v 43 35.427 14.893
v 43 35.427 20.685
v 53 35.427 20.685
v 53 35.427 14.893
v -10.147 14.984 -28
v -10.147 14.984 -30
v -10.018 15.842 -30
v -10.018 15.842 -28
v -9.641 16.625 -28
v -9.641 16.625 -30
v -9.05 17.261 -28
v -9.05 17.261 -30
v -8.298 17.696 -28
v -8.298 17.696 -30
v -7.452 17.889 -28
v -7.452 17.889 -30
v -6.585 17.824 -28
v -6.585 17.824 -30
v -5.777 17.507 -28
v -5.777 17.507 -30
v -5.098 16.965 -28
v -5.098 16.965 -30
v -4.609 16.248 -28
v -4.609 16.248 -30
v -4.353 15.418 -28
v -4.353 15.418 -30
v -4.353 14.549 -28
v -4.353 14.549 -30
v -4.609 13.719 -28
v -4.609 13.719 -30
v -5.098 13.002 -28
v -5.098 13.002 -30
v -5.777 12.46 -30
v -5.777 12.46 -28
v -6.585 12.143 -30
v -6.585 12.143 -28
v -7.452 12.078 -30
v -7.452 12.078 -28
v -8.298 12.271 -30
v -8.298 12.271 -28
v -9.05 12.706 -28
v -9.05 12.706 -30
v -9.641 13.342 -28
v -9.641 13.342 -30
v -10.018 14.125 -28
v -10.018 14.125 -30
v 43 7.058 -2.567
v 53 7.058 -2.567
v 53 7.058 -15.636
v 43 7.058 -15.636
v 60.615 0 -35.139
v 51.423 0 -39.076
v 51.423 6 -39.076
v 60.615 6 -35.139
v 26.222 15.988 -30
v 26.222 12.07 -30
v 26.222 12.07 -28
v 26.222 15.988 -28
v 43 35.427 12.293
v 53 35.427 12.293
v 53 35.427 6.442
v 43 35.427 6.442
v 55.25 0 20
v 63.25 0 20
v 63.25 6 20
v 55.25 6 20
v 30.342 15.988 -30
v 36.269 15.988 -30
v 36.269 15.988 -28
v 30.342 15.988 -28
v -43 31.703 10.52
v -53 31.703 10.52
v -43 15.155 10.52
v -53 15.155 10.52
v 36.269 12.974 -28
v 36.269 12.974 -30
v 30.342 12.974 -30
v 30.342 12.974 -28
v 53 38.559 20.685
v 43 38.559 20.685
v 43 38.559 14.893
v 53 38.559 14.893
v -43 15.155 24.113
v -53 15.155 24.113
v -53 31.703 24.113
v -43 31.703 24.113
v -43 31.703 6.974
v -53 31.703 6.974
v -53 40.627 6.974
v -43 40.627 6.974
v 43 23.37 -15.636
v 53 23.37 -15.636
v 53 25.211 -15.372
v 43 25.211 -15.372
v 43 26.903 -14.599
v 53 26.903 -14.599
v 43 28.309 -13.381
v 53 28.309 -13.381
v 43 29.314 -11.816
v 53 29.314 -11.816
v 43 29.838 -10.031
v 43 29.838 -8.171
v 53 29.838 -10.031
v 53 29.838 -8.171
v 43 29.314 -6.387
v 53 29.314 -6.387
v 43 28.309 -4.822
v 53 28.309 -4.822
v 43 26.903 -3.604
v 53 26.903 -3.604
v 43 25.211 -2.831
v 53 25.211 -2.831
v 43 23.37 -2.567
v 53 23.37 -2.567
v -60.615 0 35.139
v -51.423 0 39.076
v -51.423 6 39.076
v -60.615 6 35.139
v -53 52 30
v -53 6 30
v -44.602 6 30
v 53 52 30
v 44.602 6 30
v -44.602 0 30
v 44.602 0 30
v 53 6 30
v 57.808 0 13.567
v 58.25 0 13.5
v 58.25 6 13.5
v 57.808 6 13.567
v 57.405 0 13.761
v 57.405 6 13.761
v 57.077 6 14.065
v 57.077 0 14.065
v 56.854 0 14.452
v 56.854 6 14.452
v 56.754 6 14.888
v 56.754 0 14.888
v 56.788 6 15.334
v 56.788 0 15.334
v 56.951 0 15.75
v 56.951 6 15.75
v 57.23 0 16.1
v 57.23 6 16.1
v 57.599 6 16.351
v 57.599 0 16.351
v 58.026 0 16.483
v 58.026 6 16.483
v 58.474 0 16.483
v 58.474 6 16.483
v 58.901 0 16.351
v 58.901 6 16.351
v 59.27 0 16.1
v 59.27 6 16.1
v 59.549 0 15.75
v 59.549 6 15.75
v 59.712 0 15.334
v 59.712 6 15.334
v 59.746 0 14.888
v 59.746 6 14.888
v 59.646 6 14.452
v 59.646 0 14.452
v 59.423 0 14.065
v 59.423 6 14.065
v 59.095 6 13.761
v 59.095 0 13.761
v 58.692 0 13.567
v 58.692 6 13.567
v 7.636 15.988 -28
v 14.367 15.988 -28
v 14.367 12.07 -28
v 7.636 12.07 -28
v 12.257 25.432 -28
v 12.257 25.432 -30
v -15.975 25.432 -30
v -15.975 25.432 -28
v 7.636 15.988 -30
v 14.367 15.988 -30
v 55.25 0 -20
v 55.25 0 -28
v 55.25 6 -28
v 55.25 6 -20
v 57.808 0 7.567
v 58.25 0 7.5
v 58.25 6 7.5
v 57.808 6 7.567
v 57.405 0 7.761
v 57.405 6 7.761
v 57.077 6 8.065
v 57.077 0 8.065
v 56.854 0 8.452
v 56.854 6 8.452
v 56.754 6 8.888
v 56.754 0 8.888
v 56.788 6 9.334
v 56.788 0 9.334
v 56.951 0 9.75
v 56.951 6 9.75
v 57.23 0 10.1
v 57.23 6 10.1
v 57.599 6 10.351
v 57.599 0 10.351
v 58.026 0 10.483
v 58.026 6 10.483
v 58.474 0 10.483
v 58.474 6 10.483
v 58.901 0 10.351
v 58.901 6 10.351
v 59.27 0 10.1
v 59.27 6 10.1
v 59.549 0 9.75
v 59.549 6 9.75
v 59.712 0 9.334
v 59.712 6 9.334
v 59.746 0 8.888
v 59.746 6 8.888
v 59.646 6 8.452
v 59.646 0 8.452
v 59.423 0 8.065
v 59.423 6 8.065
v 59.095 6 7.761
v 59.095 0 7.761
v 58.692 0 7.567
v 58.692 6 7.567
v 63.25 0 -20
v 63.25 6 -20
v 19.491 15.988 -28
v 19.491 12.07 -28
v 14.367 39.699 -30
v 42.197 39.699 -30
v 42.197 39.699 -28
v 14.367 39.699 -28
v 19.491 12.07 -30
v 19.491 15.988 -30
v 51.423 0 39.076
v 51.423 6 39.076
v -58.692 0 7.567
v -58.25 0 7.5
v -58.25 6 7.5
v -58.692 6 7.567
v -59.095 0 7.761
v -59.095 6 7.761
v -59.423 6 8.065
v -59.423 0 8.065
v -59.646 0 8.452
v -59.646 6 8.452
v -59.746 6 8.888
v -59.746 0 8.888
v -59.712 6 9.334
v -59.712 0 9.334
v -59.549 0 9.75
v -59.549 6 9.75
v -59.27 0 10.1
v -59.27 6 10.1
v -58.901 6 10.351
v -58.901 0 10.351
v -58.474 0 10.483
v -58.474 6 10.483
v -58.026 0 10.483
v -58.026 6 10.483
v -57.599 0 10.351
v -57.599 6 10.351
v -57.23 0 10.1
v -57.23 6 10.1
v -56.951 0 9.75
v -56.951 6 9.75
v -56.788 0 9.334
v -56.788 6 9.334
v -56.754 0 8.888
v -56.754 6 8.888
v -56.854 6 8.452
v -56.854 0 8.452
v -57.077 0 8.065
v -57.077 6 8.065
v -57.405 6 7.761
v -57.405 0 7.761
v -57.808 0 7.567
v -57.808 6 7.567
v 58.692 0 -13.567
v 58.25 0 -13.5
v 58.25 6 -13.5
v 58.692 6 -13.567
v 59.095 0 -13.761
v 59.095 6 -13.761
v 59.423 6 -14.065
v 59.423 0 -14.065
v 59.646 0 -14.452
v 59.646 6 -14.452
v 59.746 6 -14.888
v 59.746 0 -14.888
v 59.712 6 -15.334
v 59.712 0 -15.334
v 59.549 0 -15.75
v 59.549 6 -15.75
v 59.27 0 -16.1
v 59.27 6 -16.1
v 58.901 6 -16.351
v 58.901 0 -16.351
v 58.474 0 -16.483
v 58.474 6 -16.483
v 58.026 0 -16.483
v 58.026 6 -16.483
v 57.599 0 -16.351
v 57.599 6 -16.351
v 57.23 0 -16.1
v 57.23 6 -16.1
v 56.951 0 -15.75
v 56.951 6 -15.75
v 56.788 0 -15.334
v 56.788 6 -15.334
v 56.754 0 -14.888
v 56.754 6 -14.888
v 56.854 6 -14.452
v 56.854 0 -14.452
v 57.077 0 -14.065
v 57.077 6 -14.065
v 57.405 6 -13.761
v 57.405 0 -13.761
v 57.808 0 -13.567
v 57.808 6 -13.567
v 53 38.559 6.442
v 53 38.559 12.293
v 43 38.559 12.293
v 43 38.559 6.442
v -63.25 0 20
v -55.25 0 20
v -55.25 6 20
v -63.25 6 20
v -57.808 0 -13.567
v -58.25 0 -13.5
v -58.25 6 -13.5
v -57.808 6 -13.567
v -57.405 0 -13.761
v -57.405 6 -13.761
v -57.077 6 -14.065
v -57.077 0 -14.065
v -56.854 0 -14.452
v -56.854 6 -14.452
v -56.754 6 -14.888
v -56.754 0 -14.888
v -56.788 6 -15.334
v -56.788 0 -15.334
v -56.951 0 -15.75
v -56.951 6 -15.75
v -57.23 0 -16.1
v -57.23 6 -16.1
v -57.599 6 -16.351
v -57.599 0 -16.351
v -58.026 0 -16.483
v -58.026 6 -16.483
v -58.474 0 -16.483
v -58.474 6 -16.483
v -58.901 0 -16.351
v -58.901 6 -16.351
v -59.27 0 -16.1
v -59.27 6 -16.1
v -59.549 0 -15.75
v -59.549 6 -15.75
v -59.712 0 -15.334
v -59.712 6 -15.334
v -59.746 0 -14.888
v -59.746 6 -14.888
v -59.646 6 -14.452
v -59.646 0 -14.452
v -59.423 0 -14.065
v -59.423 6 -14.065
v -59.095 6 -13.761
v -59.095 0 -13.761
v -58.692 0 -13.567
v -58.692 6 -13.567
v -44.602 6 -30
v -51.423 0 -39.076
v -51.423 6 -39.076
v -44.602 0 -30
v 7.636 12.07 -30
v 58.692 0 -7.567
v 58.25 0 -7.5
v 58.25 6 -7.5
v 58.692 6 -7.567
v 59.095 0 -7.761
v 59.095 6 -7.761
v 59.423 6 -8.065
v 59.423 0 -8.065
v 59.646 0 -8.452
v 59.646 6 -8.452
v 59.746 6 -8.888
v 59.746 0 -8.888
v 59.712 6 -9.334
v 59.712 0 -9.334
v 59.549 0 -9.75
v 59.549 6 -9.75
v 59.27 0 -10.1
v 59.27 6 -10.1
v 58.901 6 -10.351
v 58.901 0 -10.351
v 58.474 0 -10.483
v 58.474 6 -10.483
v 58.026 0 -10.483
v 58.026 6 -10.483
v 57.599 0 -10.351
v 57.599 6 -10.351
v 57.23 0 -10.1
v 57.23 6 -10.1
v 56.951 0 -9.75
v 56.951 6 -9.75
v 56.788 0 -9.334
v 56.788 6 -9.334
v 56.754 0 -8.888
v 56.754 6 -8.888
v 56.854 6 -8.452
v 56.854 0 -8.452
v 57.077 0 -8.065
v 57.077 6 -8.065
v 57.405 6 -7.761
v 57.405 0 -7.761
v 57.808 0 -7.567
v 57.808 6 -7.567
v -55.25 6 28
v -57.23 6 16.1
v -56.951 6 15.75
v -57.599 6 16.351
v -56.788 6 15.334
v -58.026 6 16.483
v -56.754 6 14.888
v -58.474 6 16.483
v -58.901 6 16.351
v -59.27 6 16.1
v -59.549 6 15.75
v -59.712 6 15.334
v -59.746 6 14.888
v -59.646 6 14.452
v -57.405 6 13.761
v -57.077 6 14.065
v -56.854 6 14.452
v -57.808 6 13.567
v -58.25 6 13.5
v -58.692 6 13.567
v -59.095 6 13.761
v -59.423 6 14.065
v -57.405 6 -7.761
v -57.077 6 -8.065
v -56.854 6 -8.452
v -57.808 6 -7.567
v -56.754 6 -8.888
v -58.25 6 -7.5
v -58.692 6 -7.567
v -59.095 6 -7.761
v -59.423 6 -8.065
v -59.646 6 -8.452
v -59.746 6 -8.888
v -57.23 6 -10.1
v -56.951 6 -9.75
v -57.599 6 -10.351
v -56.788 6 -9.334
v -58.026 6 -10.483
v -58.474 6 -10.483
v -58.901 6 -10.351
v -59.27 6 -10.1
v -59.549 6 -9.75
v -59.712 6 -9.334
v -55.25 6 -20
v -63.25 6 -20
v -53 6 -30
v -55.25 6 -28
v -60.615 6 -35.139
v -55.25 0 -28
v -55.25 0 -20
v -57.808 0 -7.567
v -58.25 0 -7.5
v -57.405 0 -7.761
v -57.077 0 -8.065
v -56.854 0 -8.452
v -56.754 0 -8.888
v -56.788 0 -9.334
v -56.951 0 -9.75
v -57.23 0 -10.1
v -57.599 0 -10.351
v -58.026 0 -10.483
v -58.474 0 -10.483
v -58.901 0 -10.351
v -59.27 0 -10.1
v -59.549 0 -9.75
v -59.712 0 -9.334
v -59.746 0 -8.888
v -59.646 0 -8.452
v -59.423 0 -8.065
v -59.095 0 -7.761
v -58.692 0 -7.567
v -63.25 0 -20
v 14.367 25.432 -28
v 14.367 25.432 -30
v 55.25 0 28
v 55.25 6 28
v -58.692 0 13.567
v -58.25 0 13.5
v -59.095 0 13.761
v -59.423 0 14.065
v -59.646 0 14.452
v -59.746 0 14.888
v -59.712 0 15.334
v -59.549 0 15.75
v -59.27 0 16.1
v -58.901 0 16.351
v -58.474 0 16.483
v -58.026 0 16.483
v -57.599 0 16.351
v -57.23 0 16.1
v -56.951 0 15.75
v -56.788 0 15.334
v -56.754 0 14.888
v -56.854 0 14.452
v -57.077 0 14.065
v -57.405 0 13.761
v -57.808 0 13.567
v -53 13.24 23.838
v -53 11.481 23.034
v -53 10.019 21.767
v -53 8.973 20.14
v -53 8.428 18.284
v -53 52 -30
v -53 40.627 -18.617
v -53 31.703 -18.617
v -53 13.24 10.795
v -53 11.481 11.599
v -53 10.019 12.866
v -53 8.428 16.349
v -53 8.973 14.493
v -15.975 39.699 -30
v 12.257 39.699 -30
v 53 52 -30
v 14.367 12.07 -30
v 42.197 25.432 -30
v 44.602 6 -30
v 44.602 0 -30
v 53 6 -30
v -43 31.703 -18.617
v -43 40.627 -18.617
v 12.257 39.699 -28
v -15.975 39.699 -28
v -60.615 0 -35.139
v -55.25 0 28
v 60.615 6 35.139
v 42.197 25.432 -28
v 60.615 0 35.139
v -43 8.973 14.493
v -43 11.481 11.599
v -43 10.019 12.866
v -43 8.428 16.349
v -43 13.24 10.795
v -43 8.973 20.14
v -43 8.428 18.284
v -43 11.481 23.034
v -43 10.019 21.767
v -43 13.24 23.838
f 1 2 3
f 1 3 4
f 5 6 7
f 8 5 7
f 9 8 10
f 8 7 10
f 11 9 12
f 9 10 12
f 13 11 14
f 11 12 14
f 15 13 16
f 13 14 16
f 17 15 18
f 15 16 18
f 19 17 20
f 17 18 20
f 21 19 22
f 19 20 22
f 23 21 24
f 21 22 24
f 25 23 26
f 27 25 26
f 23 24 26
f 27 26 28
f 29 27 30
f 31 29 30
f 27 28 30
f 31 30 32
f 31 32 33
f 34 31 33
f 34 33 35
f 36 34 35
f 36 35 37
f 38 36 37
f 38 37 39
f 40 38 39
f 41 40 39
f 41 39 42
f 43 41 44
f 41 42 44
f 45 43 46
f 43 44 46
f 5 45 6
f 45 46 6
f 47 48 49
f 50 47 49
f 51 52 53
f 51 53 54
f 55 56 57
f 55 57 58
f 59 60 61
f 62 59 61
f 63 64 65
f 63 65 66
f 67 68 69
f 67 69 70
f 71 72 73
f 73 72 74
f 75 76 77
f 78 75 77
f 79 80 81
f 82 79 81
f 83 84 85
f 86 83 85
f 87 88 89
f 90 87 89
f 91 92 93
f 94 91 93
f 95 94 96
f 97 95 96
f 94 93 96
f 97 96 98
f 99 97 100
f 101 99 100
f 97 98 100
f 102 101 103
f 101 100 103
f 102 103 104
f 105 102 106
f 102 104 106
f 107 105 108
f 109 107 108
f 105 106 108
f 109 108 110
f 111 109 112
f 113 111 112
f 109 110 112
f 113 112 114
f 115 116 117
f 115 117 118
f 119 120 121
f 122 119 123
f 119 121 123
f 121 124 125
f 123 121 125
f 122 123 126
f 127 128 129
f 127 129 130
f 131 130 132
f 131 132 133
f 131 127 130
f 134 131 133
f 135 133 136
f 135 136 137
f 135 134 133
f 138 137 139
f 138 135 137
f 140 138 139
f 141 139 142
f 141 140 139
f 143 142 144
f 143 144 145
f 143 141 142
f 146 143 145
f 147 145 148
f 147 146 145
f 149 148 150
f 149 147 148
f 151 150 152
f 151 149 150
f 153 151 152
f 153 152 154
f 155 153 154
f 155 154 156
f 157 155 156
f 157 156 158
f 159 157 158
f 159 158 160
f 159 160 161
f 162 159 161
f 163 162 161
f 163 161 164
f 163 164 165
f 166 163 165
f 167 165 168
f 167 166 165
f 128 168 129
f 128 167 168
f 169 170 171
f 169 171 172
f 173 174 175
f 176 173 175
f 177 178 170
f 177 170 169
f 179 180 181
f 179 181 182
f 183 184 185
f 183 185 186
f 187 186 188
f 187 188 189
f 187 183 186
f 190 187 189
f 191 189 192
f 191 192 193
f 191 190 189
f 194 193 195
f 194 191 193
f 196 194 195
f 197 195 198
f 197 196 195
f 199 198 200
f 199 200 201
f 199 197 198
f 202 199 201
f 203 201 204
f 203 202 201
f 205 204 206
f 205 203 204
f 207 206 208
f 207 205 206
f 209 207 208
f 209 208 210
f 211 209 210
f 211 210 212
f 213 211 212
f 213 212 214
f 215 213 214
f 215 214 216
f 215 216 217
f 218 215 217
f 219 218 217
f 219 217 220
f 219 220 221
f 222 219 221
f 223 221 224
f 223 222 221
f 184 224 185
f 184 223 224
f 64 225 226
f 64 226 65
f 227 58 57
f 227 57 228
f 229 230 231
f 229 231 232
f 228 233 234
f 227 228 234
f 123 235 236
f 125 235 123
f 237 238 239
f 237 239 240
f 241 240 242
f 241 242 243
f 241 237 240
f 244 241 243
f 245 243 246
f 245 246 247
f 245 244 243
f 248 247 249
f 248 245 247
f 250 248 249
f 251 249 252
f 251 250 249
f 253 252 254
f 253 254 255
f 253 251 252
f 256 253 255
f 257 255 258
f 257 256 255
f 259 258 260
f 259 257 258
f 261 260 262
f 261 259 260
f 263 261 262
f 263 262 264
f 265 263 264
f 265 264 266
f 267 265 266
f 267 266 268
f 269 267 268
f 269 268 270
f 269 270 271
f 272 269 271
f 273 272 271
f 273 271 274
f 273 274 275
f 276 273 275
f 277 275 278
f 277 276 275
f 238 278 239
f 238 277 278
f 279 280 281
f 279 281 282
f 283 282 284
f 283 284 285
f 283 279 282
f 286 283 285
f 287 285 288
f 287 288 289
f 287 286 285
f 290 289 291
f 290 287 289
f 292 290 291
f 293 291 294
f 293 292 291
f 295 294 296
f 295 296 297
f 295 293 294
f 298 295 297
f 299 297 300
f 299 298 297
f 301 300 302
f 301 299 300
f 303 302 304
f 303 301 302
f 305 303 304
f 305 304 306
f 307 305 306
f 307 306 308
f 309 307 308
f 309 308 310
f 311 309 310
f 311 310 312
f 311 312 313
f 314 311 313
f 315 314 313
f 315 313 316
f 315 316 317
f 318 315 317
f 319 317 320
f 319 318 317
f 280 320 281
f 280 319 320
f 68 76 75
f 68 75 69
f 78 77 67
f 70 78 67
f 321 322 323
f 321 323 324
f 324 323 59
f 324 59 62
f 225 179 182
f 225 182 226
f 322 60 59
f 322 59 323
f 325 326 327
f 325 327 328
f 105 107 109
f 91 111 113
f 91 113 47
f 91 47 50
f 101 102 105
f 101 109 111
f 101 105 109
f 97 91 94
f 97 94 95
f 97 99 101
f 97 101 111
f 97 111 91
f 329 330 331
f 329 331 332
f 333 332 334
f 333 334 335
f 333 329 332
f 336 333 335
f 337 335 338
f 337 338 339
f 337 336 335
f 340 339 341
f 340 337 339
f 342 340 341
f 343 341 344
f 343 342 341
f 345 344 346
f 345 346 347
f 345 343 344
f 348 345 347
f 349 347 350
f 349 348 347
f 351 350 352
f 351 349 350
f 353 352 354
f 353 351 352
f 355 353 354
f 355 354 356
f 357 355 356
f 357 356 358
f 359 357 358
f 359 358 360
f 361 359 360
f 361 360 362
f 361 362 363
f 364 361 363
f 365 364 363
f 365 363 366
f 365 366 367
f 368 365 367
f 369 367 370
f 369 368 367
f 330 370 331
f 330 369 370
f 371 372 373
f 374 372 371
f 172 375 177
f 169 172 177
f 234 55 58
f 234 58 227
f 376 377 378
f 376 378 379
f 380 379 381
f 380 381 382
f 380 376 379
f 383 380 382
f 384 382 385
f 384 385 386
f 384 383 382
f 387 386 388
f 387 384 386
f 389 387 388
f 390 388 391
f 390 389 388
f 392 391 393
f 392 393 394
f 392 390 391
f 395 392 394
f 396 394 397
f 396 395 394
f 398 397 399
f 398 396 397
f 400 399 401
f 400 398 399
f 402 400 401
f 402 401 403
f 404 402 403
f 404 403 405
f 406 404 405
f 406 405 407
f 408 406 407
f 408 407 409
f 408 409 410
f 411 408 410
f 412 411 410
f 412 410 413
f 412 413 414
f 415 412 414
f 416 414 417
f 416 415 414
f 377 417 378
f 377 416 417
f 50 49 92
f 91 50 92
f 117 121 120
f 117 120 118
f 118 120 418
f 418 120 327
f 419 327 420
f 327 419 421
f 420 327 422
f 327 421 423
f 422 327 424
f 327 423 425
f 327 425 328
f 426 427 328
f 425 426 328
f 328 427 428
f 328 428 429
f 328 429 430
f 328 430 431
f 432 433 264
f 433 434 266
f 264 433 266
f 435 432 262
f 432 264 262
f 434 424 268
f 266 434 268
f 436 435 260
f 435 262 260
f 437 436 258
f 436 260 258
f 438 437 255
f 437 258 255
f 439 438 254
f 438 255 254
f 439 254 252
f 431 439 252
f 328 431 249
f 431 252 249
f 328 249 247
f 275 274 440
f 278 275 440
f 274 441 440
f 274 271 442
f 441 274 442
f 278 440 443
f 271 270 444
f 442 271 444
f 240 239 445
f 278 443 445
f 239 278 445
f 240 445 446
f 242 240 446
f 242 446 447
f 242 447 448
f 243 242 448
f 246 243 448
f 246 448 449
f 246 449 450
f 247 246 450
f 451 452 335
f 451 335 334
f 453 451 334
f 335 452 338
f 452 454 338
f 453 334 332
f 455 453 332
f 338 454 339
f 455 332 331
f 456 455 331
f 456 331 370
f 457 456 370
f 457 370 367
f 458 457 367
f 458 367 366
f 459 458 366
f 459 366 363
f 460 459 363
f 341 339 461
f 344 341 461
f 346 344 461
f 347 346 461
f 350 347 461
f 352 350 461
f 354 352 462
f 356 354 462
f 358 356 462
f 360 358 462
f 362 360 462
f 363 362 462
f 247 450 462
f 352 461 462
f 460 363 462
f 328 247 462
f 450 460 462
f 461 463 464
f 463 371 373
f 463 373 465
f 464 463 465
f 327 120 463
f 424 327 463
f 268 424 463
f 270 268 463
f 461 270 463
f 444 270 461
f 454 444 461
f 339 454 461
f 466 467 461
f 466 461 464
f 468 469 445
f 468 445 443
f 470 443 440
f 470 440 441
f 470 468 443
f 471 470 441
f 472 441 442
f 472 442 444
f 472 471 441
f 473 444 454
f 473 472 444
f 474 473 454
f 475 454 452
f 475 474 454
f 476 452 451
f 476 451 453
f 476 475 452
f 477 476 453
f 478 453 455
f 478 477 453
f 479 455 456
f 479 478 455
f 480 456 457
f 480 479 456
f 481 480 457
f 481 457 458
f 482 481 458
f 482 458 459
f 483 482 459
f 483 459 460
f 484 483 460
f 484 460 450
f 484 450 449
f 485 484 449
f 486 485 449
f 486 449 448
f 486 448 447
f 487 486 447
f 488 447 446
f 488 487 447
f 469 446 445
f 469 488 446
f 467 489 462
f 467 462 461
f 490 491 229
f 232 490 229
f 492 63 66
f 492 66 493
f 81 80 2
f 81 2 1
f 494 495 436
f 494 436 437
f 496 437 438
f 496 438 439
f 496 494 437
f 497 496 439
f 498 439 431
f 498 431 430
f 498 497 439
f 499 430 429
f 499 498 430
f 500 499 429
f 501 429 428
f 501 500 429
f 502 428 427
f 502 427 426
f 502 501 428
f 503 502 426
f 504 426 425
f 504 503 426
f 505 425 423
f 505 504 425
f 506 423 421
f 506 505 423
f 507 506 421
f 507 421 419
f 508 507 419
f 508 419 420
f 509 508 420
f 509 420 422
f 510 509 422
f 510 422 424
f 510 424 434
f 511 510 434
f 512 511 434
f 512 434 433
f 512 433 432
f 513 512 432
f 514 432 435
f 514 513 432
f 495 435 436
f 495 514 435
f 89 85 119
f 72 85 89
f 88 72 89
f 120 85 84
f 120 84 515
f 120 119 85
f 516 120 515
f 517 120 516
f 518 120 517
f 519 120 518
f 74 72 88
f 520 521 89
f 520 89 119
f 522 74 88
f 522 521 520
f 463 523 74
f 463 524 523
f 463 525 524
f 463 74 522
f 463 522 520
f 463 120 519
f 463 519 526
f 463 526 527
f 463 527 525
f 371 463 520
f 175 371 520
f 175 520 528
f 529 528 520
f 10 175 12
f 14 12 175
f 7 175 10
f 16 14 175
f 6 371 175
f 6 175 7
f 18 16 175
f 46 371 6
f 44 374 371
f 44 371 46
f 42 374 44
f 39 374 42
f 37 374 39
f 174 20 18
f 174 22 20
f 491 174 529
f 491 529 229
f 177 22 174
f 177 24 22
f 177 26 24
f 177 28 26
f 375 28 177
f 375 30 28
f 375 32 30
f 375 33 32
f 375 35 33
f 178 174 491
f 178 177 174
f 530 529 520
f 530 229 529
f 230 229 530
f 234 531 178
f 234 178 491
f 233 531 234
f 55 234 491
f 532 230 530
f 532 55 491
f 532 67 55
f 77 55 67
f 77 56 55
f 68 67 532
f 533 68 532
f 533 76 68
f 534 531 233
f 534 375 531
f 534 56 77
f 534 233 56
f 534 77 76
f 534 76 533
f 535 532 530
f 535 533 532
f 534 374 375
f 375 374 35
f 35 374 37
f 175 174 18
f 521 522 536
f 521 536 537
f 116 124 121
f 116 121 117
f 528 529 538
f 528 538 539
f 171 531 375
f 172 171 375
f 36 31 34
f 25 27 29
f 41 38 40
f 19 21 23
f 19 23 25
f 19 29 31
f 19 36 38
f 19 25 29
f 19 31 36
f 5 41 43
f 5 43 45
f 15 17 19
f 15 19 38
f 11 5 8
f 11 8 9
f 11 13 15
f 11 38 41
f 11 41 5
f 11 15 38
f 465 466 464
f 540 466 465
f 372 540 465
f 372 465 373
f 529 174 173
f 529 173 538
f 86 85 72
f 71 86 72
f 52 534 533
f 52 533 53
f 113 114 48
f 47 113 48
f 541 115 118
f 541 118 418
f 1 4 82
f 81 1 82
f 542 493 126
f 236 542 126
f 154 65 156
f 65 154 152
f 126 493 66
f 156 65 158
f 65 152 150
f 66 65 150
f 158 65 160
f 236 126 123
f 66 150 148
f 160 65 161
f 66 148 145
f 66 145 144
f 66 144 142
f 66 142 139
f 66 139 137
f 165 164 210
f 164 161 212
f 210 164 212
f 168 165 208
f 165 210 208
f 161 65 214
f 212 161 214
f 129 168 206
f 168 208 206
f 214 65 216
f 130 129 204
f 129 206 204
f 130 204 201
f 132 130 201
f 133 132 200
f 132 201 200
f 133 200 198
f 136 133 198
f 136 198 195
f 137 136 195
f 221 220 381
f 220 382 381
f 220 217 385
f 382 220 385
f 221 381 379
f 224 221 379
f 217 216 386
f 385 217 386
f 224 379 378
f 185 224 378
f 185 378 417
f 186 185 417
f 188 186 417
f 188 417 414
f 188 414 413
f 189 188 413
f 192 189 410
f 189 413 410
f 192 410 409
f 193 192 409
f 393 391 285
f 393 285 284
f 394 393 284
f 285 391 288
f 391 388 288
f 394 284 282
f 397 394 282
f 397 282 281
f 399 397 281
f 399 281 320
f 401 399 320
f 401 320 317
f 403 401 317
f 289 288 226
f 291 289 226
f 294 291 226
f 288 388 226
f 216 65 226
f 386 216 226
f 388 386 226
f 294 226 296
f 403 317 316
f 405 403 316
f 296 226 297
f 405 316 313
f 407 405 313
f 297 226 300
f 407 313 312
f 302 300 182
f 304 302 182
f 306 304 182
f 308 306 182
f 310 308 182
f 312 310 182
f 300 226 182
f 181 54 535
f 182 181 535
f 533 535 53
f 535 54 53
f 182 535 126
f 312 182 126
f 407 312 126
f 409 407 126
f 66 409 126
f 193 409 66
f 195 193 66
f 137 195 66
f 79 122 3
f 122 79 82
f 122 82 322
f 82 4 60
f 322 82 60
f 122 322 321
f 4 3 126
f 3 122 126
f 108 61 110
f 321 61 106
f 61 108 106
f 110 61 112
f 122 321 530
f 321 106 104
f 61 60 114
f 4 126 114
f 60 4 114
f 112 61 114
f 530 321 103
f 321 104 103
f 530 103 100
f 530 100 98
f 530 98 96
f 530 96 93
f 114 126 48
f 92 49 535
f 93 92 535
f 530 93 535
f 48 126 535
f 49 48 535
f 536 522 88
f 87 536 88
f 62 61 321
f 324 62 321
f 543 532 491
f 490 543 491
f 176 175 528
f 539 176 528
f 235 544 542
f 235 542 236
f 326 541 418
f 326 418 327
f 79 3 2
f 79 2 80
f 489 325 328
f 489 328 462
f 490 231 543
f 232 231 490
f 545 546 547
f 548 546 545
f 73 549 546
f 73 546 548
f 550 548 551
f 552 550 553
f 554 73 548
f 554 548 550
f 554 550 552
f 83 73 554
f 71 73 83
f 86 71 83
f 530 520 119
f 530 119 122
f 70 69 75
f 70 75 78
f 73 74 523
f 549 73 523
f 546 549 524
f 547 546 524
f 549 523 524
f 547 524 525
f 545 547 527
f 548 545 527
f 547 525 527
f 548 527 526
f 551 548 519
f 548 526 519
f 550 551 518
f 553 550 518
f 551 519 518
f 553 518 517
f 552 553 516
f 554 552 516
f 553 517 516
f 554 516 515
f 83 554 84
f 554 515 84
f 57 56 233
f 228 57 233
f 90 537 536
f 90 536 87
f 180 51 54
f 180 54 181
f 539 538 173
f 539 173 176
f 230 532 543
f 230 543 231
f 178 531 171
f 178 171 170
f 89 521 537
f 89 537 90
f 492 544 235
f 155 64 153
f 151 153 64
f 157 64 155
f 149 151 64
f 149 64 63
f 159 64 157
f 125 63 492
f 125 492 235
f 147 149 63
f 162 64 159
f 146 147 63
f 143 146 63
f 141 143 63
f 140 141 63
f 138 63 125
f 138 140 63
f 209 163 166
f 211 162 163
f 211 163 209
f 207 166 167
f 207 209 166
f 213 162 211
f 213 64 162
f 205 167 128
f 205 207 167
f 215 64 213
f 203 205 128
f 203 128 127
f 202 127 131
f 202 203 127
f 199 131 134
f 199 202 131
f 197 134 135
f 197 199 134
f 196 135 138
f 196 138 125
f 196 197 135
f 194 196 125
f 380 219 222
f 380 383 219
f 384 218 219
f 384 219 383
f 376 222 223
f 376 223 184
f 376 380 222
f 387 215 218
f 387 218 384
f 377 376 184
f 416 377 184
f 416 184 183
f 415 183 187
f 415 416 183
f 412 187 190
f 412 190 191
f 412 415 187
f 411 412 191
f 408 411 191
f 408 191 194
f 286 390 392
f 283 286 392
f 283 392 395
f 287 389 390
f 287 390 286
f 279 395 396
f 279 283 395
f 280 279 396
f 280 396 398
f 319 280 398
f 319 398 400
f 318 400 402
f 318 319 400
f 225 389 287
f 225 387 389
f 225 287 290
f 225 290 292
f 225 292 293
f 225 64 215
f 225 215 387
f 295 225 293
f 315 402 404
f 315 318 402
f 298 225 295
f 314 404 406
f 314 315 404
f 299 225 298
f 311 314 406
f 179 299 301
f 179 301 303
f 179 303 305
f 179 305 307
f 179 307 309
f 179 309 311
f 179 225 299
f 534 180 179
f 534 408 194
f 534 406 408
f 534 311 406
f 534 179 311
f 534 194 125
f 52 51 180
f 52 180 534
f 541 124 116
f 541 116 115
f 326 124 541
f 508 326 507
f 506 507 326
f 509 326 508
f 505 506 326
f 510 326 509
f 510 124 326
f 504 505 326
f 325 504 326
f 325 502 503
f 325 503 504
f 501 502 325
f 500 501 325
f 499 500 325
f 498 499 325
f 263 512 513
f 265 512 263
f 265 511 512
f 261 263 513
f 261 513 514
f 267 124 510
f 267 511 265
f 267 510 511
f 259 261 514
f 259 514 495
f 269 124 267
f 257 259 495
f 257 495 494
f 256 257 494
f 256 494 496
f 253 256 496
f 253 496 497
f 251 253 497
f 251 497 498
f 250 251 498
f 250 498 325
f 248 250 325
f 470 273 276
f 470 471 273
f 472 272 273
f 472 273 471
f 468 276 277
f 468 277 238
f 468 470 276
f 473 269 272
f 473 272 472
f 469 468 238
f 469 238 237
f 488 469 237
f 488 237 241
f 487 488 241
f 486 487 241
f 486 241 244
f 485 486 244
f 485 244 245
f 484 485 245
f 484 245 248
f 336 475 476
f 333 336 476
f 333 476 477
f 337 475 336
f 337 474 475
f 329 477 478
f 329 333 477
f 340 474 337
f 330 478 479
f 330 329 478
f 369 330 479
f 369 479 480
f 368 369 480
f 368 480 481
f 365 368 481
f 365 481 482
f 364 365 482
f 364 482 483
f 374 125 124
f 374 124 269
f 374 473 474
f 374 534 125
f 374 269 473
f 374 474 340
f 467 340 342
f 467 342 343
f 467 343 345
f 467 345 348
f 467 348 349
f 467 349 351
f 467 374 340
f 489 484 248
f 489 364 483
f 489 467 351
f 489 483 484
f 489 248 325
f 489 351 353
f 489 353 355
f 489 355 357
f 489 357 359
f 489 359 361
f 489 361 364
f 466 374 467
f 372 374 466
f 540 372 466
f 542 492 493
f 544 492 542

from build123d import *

# Parameters (mm, degrees)
SKETCH_1_R          = 1.5
EXTRUDE_1_DEPTH     = 6
SKETCH_2_W          = 106
SKETCH_2_H          = 60
EXTRUDE_2_DEPTH     = 46
SKETCH_3_R          = 2.913601035
SKETCH_3_W          = 27.829913336
SKETCH_3_H          = 14.266598172
SKETCH_3_W_2        = 28.231789341
SKETCH_3_W_3        = 5.927671071
SKETCH_3_H_2        = 3.014070036
SKETCH_3_W_4        = 6.731423082
SKETCH_3_H_3        = 3.918291047
CUT_EXTRUDE_1_DEPTH = 2
SKETCH_4_W          = 5.850937101
SKETCH_4_H          = 3.132319863
SKETCH_4_W_2        = 5.791836726
CUT_EXTRUDE_2_DEPTH = 10
SKETCH_5_W          = 25.590462272
SKETCH_5_H          = 8.924156589
CUT_EXTRUDE_3_DEPTH = 10


with BuildPart() as part:
    # 草图1 → 凸台-拉伸1 (new body)
    with BuildSketch(Plane(origin=(0, 0, 0), x_dir=(1, 0, 0), z_dir=(0, 1, 0))):
        Polygon((44.601753779, -30), (-44.601753779, -30), (-51.423054046, -39.075905643), (-60.615391847, -35.138784137), (-55.25, -28), (-55.25, -20), (-63.25, -20), (-63.25, 20), (-55.25, 20), (-55.25, 28), (-60.615391847, 35.138784137), (-51.423054046, 39.075905643), (-44.601753779, 30), (44.601753779, 30), (51.423054046, 39.075905643), (60.615391847, 35.138784137), (55.25, 28), (55.25, 20), (63.25, 20), (63.25, -20), (55.25, -20), (55.25, -28), (60.615391847, -35.138784137), (51.423054046, -39.075905643), align=None)
        with Locations(Location((58.25, 15, 0), (0, 0, 270))):
            Circle(SKETCH_1_R, mode=Mode.SUBTRACT)
        with Locations(Location((-58.25, 15, 0), (0, 0, 270))):
            Circle(SKETCH_1_R, mode=Mode.SUBTRACT)
        with Locations(Location((58.25, 9, 0), (0, 0, 270))):
            Circle(SKETCH_1_R, mode=Mode.SUBTRACT)
        with Locations(Location((-58.25, 9, 0), (0, 0, 270))):
            Circle(SKETCH_1_R, mode=Mode.SUBTRACT)
        with Locations(Location((58.25, -9, 0), (0, 0, 90))):
            Circle(SKETCH_1_R, mode=Mode.SUBTRACT)
        with Locations(Location((58.25, -15, 0), (0, 0, 90))):
            Circle(SKETCH_1_R, mode=Mode.SUBTRACT)
        with Locations(Location((-58.25, -9, 0), (0, 0, 90))):
            Circle(SKETCH_1_R, mode=Mode.SUBTRACT)
        with Locations(Location((-58.25, -15, 0), (0, 0, 90))):
            Circle(SKETCH_1_R, mode=Mode.SUBTRACT)
    extrude(amount=EXTRUDE_1_DEPTH)

    # 草图2 → 凸台-拉伸2 (add)
    with BuildSketch(Plane(origin=(0, 6, 0), x_dir=(1, 0, 0), z_dir=(0, 1, 0))):
        Rectangle(SKETCH_2_W, SKETCH_2_H)
    extrude(amount=EXTRUDE_2_DEPTH)

    # 草图3 → 切除-拉伸1 (cut)
    with BuildSketch(Plane(origin=(0, 0, -30), x_dir=(-1, 0, 0), z_dir=(0, 0, -1))):
        with Locations((7.233768087, 14.983525058)):
            Circle(SKETCH_3_R)
        with Locations((-28.282023842, 32.56560027)):
            Rectangle(SKETCH_3_W, SKETCH_3_H)
        with Locations((1.858676522, 32.56560027)):
            Rectangle(SKETCH_3_W_2, SKETCH_3_H)
        with Locations((-33.305473902, 14.481180052)):
            Rectangle(SKETCH_3_W_3, SKETCH_3_H_2)
        with Locations((-22.856697776, 14.029069547)):
            Rectangle(SKETCH_3_W_4, SKETCH_3_H_3)
        with Locations((-11.001355633, 14.029069547)):
            Rectangle(SKETCH_3_W_4, SKETCH_3_H_3)
    extrude(amount=-CUT_EXTRUDE_1_DEPTH, mode=Mode.SUBTRACT)

    # 草图4 → 切除-拉伸2 (cut)
    with BuildSketch(Plane(origin=(53, 0, 0), x_dir=(0, 0, -1), z_dir=(1, 0, 0))):
        with BuildLine():
            ThreePointArc((15.636259672, 23.370033323), (9.101457713, 29.904835281), (2.566655755, 23.370033323))
            Line((2.566655755, 23.370033323), (15.636259672, 23.370033323))
        make_face()
        with BuildLine():
            Line((15.636259672, 23.370033323), (2.566655755, 23.370033323))
            ThreePointArc((2.566655755, 23.370033323), (9.101457713, 16.835231365), (15.636259672, 23.370033323))
        make_face()
        with BuildLine():
            ThreePointArc((15.636259672, 23.370033323), (9.101457713, 16.835231365), (2.566655755, 23.370033323))
            Line((2.566655755, 23.370033323), (2.566655755, 7.058329889))
            Line((2.566655755, 7.058329889), (15.636259672, 7.058329889))
            Line((15.636259672, 7.058329889), (15.636259672, 23.370033323))
        make_face()
        with Locations((-9.3674094, 36.992669706)):
            Rectangle(SKETCH_4_W, SKETCH_4_H)
        with Locations((-17.789212803, 36.992669706)):
            Rectangle(SKETCH_4_W_2, SKETCH_4_H)
    extrude(amount=-CUT_EXTRUDE_2_DEPTH, mode=Mode.SUBTRACT)

    # 草图5 → 切除-拉伸3 (cut)
    with BuildSketch(Plane.ZY.offset(53)):
        with BuildLine():
            Line((10.519866707, 31.703186164), (10.519866707, 15.155081231))
            ThreePointArc((10.519866707, 15.155081231), (17.316409805, 21.951624329), (24.112952903, 15.155081231))
            Line((24.112952903, 15.155081231), (24.112952903, 31.703186164))
            Line((24.112952903, 31.703186164), (10.519866707, 31.703186164))
        make_face()
        with BuildLine():
            ThreePointArc((24.112952903, 15.155081231), (17.316409805, 21.951624329), (10.519866707, 15.155081231))
            Line((10.519866707, 15.155081231), (24.112952903, 15.155081231))
        make_face()
        with BuildLine():
            Line((24.112952903, 15.155081231), (10.519866707, 15.155081231))
            ThreePointArc((10.519866707, 15.155081231), (17.316409805, 8.358538134), (24.112952903, 15.155081231))
        make_face()
        with Locations((-5.821386914, 36.165264459)):
            Rectangle(SKETCH_5_W, SKETCH_5_H)
    extrude(amount=-CUT_EXTRUDE_3_DEPTH, mode=Mode.SUBTRACT)


solid = part.part
